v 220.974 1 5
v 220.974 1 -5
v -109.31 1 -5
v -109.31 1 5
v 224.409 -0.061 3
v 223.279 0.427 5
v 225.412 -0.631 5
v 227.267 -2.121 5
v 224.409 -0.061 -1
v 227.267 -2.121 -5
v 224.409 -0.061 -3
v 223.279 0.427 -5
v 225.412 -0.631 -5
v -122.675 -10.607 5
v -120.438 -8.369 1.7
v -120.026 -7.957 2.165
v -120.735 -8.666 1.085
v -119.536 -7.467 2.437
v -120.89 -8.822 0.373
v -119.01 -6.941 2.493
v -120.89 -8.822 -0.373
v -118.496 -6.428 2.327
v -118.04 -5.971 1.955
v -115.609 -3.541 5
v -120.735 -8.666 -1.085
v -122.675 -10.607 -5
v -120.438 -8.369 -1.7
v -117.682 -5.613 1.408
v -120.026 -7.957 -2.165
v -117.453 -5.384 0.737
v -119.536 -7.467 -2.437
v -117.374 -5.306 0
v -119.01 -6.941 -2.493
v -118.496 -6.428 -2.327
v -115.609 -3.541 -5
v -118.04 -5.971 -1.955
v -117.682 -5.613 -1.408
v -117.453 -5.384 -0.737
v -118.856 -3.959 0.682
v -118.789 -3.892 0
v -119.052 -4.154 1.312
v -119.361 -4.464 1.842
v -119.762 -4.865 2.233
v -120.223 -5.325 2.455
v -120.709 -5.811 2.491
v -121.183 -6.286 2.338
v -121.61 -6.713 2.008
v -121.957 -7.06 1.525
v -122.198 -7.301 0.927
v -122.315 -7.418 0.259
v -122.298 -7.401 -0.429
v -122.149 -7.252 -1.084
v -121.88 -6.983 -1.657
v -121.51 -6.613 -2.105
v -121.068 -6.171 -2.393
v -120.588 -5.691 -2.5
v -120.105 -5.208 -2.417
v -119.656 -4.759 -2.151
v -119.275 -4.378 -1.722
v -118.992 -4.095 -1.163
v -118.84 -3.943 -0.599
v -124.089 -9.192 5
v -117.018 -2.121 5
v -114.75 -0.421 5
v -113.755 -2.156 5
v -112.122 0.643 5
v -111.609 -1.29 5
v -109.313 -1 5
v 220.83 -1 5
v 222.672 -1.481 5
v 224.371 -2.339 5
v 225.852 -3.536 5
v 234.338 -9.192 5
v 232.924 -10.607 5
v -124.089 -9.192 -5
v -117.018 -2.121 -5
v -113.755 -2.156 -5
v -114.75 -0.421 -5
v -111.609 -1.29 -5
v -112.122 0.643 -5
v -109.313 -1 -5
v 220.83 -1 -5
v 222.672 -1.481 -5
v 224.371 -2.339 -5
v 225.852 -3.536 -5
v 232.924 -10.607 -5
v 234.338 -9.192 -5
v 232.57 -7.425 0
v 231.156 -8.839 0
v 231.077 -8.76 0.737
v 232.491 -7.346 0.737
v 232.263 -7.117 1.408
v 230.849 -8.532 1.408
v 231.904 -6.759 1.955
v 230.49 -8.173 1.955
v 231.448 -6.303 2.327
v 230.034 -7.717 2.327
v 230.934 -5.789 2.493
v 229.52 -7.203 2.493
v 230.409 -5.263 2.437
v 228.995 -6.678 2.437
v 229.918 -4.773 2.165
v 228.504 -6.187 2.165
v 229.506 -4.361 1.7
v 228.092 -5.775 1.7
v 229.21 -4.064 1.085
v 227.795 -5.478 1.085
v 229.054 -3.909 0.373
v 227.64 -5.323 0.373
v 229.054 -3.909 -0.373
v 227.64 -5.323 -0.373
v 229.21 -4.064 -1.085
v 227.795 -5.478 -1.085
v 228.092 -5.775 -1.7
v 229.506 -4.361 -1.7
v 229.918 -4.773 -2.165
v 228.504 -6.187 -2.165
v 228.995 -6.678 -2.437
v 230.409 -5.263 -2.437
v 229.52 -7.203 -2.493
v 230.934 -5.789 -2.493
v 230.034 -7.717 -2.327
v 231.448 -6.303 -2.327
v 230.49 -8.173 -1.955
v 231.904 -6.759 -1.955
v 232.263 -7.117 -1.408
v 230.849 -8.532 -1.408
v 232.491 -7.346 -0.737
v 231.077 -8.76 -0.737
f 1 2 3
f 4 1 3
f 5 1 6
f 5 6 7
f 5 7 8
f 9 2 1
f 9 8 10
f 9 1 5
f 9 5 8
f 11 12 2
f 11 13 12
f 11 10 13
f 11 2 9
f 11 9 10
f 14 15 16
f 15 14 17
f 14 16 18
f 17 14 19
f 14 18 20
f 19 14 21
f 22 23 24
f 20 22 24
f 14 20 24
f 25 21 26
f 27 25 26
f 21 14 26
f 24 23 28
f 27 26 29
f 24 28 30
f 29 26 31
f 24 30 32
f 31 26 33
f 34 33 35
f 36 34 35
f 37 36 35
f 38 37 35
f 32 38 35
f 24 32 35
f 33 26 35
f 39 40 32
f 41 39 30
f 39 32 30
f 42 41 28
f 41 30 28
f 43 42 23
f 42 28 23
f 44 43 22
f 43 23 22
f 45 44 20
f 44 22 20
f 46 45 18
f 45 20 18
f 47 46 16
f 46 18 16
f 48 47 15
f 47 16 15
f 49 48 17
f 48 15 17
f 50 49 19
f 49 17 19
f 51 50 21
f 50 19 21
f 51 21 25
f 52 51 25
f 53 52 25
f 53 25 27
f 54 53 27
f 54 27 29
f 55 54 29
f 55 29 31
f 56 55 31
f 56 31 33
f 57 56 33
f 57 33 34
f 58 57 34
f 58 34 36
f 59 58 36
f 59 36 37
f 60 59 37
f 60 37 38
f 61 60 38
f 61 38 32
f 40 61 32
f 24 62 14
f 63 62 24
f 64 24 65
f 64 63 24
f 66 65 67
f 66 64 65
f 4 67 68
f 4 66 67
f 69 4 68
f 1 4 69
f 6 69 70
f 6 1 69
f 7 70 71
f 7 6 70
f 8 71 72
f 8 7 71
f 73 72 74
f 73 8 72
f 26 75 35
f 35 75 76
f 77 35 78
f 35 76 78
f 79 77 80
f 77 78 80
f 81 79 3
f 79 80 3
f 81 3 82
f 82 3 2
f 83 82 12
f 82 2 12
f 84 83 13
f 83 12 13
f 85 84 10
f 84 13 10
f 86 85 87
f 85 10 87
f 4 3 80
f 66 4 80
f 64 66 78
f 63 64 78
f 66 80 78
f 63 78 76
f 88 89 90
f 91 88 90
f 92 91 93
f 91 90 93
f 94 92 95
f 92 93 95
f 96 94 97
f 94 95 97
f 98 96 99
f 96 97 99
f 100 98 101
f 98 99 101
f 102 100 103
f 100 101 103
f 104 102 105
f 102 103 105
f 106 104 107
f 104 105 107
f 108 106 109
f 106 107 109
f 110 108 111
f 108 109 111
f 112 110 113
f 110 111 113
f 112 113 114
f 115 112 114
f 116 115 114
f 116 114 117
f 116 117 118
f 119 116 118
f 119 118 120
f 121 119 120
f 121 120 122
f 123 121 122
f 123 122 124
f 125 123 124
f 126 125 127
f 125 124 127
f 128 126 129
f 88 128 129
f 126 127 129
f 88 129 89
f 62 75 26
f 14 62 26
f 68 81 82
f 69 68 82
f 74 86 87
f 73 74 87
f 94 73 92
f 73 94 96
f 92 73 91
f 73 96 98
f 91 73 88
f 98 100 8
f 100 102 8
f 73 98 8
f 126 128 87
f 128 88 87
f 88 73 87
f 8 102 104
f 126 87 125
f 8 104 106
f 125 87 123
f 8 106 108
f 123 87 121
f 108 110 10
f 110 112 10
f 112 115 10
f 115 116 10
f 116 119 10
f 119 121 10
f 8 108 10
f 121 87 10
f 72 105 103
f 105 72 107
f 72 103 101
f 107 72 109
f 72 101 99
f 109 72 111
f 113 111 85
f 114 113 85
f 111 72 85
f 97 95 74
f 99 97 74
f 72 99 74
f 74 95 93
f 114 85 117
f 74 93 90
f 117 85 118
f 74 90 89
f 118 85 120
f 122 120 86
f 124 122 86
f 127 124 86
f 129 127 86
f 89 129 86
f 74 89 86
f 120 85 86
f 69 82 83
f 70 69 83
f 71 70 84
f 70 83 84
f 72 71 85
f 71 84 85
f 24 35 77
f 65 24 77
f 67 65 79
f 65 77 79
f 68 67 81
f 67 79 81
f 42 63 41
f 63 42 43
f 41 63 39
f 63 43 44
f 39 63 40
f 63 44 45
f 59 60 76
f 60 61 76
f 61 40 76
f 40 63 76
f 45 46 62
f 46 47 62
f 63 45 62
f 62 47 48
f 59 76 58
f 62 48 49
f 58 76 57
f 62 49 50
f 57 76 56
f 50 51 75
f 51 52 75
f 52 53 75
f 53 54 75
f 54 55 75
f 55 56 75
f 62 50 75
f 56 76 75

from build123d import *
from OCP.BRepAlgoAPI import BRepAlgoAPI_Cut
from OCP.TopTools import TopTools_ListOfShape

# Parameters (mm, degrees)
SWEEP1_START       = -5
SWEEP1_DEPTH       = 10
SKETCH3_R          = 2.5
CUT_EXTRUDE1_DEPTH = 10
SKETCH6_R          = 2.5
CUT_EXTRUDE2_DEPTH = 2


with BuildPart() as part:
    # Sweep1: read off the stored shape, not the designer's step
    # Sweep1 outline → Sweep1 (new body)
    with BuildSketch(Plane.XY.offset(SWEEP1_START)):
        with BuildLine():
            Line((232.923534553, -10.606601718), (234.337748115, -9.192388155))
            Line((234.337748115, -9.192388155), (227.266680303, -2.121320344))
            add(Edge.make_bspline(
                [(220.973792806, 1.000000004), (220.996623613, 0.996738482), (221.019823203, 0.993424062), (221.32319859, 0.950076613), (221.626964068, 0.894672744), (222.202549229, 0.764511245), (222.487656849, 0.687861068), (223.332329716, 0.423928716), (223.881232147, 0.202580142), (225.463987163, -0.588990805), (226.43267267, -1.28731271), (227.266680303, -2.121320344)],
                knots=[-0.004264936, -0.004264936, -0.004264936, -0.004264936, 0, 0, 0.048942856, 0.048942856, 0.097885713, 0.097885713, 0.195771425, 0.195771425, 0.39154285, 0.39154285, 0.39154285, 0.39154285], degree=3))
            Line((220.973792806, 1.000000004), (-109.309697151, 0.999999892))
            ThreePointArc((-109.309697151, 0.999999892), (-113.470401554, 0.195974843), (-117.018410768, -2.121253679))
            Line((-117.018410768, -2.121253679), (-124.089413627, -9.192388155))
            Line((-124.089413627, -9.192388155), (-122.675200065, -10.606601718))
            Line((-122.675200065, -10.606601718), (-115.609189907, -3.540595572))
            ThreePointArc((-115.609189907, -3.540595572), (-112.70975362, -1.653770585), (-109.312780923, -1.000000132))
            Line((-109.312780923, -1.000000132), (220.829769992, -1))
            ThreePointArc((220.829769992, -1), (223.54434808, -1.865184594), (225.852466741, -3.535533906))
            Line((225.852466741, -3.535533906), (232.923534553, -10.606601718))
        make_face()
    extrude(amount=SWEEP1_DEPTH)


with BuildPart() as cut_extrude1_tool:
    # Sketch3 → Cut-Extrude1 (new body)
    with BuildSketch(Plane(origin=(-56.034299174, 56.034299174, 0), x_dir=(0, 0, -1), z_dir=(0.7071067811865286, -0.7071067811865666, 0))):
        with Locations(Location((0, -89.248043129, 0), (0, 0, 90))):
            Circle(SKETCH3_R)
    extrude(amount=-CUT_EXTRUDE1_DEPTH)


with BuildPart() as part_1:
    add(part.part)

    # Cut-Extrude1: cut by cut_extrude1_tool, with a tolerance
    cut_extrude1_stock = TopTools_ListOfShape()
    cut_extrude1_stock.Append(part_1.part.wrapped)
    cut_extrude1_tools = TopTools_ListOfShape()
    cut_extrude1_tools.Append(cut_extrude1_tool.part.wrapped)
    cut_extrude1_cut = BRepAlgoAPI_Cut()
    cut_extrude1_cut.SetArguments(cut_extrude1_stock)
    cut_extrude1_cut.SetTools(cut_extrude1_tools)
    cut_extrude1_cut.SetFuzzyValue(0.00001)
    cut_extrude1_cut.Build()
    add(Compound.cast(cut_extrude1_cut.Shape()).solids(), mode=Mode.REPLACE)

    # Sketch6 → Cut-Extrude2 (cut)
    with BuildSketch(Plane(origin=(111.158466417, 111.158466417, 0), x_dir=(0, 0, 1), z_dir=(-0.7071067811865477, -0.7071067811865475, 0))):
        with Locations(Location((0, -167.20181078, 0), (0, 0, 270))):
            Circle(SKETCH6_R)
    extrude(amount=-CUT_EXTRUDE2_DEPTH, mode=Mode.SUBTRACT)


solid = part_1.part
